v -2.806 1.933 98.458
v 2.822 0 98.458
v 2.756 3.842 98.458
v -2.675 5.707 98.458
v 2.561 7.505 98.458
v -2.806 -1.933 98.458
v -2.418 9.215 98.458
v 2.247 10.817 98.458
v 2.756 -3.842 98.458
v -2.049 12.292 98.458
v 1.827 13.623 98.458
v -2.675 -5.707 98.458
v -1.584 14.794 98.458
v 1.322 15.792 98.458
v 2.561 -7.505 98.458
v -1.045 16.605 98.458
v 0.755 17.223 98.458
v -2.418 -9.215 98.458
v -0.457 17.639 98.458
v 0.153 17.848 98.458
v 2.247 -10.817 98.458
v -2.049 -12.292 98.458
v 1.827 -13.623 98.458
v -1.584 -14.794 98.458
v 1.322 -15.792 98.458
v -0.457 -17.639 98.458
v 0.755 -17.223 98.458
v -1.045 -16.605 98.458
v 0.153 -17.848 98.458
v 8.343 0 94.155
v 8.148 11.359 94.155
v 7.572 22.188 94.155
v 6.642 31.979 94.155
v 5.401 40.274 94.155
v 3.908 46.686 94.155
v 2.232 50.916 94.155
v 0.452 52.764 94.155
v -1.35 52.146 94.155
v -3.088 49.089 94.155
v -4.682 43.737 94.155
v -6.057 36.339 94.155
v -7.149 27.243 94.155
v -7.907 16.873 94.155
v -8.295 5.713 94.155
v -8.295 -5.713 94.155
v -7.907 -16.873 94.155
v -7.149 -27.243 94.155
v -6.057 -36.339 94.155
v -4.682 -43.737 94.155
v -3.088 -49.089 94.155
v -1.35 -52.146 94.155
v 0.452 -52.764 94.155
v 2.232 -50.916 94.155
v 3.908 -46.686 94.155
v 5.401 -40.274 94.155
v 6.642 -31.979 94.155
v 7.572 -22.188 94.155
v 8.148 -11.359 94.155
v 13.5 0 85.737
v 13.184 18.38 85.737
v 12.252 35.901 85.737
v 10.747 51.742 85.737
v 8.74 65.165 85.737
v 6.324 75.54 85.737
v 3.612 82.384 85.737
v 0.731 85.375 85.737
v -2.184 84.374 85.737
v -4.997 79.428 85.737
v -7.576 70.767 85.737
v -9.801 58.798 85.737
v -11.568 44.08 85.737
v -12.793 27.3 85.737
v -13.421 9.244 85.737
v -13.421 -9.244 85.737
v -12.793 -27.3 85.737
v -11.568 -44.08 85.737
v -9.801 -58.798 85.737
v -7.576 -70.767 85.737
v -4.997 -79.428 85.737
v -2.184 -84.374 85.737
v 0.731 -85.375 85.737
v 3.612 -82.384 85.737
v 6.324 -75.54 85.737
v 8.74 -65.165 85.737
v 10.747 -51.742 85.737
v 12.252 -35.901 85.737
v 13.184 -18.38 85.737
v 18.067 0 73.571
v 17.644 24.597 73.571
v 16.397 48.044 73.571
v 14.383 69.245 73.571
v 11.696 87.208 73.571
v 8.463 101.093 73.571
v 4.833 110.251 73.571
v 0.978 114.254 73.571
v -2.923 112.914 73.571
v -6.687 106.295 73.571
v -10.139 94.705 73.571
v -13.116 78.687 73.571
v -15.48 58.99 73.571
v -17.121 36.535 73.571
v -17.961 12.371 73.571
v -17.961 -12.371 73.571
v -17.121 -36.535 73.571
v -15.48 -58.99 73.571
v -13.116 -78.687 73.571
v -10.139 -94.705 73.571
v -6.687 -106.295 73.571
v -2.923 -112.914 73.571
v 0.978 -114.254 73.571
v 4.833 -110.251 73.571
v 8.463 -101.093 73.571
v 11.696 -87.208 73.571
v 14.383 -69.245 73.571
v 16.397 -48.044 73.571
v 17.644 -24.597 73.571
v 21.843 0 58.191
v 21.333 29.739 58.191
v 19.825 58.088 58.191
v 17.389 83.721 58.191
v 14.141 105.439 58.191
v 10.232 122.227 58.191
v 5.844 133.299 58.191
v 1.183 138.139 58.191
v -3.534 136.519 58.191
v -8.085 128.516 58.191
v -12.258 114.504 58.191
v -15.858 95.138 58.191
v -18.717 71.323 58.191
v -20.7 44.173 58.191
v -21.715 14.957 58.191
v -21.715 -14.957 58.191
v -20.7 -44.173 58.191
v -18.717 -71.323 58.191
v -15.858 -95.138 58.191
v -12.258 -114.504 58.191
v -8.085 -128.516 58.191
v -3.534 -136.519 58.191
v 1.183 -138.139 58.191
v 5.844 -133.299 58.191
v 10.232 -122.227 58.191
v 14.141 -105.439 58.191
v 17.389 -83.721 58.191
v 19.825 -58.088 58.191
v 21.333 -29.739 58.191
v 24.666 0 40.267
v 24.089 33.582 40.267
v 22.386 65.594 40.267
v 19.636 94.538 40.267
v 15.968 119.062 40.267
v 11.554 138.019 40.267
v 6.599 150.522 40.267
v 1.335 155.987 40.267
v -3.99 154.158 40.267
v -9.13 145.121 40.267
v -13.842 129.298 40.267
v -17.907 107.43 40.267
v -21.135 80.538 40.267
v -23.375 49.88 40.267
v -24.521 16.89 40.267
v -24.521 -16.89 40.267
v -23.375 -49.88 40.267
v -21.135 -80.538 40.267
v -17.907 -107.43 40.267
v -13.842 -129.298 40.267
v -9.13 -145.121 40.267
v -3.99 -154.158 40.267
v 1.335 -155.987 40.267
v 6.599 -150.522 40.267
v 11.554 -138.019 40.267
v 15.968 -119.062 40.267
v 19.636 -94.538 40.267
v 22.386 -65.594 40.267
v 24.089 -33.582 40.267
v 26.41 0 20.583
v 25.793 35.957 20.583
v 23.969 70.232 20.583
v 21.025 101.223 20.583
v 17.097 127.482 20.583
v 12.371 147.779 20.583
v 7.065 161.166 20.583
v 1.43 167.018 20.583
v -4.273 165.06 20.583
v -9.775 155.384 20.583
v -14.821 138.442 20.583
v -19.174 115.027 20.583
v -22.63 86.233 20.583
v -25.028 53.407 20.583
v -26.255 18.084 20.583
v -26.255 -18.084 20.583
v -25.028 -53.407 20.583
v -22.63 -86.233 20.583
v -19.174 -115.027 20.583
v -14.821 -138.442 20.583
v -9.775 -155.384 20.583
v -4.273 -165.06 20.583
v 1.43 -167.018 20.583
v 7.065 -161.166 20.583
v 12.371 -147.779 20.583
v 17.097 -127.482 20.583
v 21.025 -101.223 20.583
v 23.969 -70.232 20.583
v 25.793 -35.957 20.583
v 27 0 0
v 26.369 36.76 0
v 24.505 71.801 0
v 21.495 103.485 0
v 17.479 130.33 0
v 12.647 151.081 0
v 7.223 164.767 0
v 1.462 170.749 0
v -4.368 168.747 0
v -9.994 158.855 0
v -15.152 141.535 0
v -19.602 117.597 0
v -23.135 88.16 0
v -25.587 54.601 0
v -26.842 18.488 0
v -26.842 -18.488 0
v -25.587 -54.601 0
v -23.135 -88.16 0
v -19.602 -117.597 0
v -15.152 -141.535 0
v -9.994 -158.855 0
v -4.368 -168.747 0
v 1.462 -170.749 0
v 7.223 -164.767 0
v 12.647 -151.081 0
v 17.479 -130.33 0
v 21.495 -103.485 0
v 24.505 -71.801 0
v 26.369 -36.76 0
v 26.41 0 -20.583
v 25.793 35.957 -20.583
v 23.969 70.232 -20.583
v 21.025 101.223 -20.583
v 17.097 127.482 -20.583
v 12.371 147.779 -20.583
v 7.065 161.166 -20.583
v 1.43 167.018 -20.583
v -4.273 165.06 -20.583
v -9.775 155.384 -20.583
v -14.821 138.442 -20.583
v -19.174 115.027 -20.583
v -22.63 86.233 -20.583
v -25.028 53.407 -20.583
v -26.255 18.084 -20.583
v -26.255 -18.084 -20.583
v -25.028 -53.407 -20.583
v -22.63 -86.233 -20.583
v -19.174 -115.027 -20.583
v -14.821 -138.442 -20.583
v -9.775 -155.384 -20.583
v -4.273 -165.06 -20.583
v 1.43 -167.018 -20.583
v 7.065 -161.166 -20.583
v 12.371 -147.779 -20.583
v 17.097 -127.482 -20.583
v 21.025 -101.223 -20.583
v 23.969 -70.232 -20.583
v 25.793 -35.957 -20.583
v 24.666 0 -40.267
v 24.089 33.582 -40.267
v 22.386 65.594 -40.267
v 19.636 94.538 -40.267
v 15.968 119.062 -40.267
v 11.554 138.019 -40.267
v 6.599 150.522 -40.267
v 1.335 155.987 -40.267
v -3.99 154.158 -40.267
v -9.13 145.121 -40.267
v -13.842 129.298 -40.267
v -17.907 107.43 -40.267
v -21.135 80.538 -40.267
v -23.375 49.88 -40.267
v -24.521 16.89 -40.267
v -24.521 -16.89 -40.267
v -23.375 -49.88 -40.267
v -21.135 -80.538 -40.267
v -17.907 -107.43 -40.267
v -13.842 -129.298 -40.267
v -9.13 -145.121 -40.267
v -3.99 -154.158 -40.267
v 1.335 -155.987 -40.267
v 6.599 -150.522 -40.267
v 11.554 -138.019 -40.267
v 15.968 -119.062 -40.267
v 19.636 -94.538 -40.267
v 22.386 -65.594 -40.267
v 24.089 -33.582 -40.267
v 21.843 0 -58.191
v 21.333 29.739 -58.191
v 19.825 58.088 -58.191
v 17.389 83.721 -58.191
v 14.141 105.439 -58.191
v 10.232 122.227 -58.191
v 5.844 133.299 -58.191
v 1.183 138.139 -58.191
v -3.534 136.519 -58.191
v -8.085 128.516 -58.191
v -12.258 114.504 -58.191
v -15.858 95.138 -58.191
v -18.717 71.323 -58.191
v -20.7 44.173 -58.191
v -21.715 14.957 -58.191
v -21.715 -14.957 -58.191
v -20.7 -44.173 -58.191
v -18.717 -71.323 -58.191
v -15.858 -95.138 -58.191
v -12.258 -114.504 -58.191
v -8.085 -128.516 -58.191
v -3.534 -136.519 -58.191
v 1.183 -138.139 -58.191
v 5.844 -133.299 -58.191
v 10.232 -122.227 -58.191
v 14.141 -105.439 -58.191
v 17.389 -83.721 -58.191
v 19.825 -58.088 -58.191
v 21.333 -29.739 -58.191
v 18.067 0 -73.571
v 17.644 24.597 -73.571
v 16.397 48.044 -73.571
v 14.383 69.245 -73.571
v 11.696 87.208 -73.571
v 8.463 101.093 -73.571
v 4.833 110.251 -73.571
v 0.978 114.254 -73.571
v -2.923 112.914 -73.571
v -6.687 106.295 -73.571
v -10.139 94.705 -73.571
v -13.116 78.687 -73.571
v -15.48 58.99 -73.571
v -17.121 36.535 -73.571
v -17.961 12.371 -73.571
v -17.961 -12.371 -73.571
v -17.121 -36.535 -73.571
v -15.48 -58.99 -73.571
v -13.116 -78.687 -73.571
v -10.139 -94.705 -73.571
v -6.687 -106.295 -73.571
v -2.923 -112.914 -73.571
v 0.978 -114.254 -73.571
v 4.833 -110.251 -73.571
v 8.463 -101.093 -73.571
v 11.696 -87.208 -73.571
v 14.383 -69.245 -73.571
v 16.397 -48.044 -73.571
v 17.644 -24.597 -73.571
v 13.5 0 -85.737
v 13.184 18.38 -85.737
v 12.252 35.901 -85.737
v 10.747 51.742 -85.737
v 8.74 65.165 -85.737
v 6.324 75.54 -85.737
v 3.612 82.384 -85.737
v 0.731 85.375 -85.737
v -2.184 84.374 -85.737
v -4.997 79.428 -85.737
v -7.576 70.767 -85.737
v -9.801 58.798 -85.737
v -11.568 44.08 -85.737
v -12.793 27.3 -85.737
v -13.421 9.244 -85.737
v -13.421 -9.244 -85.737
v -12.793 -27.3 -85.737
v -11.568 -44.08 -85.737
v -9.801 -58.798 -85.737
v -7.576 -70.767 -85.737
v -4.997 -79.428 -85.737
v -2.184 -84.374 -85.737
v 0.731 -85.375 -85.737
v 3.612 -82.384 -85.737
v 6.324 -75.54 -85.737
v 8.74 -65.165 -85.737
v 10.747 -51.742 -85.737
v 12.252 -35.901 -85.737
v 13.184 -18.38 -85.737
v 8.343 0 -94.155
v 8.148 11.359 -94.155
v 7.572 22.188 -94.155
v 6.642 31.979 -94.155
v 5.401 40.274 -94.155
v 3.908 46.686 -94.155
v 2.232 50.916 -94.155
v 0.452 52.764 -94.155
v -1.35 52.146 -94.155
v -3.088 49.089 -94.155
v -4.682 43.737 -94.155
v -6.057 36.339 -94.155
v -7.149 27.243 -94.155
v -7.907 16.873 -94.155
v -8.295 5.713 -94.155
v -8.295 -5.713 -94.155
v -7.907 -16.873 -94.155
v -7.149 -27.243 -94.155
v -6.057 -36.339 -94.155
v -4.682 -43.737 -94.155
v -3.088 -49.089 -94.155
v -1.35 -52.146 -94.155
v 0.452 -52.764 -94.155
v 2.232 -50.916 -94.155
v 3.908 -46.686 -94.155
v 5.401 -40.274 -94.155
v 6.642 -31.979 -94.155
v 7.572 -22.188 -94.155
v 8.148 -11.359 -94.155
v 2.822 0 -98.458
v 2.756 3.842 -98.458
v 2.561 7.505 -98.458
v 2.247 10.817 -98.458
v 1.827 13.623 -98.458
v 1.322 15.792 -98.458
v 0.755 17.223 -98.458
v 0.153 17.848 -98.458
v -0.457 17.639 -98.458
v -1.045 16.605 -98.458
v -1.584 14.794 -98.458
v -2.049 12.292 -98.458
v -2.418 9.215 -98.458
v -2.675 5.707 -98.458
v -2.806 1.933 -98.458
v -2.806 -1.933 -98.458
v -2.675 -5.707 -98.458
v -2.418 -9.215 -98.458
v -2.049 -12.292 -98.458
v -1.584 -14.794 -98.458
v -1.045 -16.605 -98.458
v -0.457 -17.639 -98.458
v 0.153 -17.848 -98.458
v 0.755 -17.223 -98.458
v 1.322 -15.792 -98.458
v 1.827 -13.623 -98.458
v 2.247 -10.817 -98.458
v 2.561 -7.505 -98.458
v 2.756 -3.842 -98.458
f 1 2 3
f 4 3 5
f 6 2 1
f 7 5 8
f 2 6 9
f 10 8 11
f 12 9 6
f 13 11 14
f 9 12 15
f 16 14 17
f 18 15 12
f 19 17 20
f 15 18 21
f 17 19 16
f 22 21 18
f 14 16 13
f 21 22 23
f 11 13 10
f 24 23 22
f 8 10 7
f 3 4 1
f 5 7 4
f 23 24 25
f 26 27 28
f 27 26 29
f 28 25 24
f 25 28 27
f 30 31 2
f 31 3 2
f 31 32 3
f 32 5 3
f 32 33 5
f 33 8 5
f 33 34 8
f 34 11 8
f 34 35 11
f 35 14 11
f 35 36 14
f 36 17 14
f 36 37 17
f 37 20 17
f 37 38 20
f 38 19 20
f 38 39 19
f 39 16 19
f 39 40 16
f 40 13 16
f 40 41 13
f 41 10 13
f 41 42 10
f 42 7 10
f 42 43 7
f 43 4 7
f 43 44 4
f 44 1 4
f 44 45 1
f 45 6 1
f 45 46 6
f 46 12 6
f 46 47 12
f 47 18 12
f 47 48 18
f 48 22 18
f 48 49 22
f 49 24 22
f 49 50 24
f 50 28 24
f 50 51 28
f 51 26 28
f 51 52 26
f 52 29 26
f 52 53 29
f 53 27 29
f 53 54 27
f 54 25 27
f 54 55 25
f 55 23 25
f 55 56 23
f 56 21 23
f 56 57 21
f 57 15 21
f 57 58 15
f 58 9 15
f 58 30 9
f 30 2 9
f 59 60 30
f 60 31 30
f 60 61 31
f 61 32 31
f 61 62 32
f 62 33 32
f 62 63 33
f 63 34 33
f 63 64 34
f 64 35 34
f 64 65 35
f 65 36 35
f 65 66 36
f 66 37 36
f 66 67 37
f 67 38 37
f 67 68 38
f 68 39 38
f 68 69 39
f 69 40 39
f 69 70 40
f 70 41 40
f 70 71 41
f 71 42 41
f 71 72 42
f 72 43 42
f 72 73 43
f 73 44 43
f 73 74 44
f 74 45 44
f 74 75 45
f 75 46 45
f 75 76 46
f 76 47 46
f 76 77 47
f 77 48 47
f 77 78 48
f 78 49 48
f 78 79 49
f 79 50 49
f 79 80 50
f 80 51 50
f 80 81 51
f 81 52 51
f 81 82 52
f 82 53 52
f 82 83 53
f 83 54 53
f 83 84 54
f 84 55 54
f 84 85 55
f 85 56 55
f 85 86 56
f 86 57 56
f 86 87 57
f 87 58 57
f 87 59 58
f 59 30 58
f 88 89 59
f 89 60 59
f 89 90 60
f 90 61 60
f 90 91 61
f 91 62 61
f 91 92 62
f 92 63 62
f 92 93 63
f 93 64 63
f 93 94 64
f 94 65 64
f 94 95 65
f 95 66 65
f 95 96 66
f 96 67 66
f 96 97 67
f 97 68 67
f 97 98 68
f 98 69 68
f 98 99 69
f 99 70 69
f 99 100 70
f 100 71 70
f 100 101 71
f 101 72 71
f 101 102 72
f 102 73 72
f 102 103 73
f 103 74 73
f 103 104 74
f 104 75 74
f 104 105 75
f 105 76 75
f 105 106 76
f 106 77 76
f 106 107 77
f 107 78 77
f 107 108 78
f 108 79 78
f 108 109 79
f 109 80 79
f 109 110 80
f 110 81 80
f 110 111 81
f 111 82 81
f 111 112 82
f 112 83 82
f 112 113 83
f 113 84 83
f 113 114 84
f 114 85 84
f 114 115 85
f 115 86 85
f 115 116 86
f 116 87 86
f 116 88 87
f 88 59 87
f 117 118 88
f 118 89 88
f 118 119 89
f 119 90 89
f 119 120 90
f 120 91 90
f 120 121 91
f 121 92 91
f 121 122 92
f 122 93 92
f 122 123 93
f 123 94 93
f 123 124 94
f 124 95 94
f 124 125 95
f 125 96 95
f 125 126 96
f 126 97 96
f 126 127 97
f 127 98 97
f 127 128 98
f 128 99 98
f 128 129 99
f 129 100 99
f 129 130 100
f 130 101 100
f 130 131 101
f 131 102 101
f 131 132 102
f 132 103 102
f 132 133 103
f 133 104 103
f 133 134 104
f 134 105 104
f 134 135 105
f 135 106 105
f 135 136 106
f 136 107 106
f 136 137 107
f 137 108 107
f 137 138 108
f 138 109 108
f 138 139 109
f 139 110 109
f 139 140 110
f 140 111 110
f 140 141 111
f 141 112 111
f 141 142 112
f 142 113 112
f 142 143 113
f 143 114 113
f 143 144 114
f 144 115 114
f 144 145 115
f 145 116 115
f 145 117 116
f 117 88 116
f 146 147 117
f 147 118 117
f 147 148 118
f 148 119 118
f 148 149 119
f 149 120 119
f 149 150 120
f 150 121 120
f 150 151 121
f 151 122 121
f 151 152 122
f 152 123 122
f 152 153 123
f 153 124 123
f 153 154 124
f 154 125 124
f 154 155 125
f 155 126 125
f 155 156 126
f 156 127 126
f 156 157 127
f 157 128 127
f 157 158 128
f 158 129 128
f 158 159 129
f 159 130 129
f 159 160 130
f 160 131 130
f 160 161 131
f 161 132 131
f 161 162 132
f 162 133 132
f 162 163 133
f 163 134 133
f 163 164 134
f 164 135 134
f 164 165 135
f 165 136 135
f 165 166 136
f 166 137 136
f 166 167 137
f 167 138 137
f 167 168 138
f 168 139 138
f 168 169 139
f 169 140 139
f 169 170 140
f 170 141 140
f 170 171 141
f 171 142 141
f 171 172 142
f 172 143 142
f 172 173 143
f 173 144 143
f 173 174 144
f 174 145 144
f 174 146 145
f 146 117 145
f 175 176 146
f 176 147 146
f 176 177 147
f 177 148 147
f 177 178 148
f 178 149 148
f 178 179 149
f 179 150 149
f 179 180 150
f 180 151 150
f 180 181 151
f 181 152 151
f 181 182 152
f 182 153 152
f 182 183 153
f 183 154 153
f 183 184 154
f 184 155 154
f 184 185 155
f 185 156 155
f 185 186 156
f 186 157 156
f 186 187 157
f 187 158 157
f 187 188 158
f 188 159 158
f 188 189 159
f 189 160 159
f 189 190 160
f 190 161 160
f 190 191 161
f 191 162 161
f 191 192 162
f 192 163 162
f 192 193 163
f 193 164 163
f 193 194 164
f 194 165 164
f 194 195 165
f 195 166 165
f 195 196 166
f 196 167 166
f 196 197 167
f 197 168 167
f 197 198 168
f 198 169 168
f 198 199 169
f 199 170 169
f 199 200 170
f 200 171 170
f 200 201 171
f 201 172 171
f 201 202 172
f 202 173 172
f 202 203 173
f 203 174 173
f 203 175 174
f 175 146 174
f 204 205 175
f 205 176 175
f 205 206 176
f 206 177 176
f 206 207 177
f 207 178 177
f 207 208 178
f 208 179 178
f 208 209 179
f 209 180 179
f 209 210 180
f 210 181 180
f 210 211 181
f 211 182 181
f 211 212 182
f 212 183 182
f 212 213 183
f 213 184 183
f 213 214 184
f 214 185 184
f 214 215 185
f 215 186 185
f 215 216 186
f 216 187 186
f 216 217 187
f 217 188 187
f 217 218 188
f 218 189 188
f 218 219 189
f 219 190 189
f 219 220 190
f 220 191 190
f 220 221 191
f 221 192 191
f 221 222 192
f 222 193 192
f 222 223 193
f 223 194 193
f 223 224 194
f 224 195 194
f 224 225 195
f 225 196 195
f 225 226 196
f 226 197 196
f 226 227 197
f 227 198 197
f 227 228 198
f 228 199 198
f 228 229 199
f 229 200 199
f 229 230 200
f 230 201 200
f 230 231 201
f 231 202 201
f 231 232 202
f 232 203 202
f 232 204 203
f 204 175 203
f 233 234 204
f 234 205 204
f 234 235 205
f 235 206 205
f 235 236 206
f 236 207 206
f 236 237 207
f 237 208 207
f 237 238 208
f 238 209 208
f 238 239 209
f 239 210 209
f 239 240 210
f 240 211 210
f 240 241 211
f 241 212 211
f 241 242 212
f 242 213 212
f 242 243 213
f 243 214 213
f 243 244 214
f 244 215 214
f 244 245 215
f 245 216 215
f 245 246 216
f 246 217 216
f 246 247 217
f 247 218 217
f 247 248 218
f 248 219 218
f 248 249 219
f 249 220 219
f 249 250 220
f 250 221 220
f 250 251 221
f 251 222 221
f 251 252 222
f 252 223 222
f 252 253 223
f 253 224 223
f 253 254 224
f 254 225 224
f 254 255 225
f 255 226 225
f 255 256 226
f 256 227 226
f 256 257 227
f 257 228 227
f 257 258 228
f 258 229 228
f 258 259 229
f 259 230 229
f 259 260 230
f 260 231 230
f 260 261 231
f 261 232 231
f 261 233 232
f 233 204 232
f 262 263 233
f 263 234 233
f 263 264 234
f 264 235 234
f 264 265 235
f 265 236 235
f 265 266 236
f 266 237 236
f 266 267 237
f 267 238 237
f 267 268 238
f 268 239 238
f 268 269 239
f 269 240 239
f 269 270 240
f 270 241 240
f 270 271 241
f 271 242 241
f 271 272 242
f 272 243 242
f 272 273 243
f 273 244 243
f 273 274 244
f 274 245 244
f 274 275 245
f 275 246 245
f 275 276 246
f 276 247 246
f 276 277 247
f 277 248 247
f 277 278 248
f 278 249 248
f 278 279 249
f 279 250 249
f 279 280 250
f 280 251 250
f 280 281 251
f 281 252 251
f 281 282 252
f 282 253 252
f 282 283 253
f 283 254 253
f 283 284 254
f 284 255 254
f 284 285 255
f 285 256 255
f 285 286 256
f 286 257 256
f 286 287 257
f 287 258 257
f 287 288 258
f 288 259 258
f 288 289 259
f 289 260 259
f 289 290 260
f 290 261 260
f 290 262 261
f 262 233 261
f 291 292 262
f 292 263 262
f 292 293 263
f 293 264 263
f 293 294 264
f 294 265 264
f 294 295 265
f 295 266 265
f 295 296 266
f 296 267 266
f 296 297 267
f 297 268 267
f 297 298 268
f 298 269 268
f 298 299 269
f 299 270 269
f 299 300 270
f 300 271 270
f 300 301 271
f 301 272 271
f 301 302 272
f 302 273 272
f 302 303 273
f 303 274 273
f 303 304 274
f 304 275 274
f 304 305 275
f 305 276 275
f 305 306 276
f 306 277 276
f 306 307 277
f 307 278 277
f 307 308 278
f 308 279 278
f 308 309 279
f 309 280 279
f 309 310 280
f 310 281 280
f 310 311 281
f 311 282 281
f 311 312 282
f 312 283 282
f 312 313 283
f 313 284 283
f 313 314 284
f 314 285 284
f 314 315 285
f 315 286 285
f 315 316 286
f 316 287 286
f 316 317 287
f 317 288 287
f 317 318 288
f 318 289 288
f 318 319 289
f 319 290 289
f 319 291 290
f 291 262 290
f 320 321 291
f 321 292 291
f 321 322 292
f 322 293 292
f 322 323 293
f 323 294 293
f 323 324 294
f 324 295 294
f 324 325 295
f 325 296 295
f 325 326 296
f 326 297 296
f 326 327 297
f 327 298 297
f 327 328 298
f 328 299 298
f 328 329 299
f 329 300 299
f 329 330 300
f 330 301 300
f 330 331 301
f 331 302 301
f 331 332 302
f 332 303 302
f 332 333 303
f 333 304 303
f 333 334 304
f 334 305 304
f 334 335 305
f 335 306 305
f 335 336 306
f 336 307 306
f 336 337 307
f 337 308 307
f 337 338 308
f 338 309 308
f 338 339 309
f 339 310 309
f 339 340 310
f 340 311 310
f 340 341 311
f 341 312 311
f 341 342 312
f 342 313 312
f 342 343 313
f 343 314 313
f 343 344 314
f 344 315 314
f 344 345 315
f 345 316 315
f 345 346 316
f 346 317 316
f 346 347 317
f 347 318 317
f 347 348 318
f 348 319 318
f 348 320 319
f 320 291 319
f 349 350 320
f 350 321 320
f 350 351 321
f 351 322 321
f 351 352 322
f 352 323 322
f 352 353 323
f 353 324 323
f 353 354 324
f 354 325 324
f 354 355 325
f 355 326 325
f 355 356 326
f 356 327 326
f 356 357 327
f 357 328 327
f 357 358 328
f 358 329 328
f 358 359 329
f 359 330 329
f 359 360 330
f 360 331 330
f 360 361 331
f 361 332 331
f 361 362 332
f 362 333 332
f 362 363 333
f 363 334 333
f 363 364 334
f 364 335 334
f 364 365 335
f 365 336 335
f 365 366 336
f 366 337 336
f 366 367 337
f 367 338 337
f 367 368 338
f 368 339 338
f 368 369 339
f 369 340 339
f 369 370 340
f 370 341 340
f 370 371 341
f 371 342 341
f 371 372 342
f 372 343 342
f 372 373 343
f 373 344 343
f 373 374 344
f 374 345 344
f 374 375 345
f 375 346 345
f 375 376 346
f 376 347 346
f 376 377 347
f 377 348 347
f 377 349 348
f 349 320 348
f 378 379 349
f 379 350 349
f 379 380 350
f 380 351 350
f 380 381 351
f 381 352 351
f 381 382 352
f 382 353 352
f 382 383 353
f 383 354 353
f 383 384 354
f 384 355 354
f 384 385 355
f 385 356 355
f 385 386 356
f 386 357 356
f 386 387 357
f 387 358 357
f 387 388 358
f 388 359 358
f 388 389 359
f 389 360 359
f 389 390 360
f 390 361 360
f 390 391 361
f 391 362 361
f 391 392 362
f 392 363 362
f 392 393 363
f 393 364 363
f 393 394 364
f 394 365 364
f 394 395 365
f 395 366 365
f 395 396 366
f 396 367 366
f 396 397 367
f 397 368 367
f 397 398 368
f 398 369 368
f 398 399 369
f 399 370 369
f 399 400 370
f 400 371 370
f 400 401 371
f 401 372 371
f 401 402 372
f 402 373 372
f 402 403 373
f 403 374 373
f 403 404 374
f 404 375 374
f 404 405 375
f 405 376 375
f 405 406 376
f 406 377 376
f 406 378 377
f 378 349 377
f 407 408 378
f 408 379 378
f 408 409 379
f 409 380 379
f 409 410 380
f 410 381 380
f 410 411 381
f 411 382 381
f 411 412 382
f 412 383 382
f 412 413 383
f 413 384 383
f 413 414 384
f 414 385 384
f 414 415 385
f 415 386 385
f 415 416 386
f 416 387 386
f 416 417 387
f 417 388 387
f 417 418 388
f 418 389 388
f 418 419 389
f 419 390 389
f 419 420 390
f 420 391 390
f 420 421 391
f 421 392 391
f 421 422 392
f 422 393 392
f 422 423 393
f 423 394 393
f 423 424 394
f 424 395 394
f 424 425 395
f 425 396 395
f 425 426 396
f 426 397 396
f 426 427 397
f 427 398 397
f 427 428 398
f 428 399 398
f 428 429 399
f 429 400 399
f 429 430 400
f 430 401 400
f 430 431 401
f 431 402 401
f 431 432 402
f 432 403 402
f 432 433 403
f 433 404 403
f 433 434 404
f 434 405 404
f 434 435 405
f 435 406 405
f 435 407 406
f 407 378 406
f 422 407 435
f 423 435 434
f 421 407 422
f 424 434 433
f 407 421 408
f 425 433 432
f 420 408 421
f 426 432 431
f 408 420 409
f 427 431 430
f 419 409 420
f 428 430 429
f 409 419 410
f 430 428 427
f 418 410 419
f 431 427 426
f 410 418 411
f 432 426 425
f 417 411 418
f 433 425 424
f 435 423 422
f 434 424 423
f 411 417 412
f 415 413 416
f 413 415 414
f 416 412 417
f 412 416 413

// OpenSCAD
// Generated by SolidPython 1.0.1 on 2020-07-29 00:46:46


scale(v = [3, 19, 11]) {
	sphere(r = 9);
}
/***********************************************
*********      SolidPython code:      **********
************************************************
 
# import packages: SolidPython
from solid import *
from solid.utils import *
from itertools import chain, combinations, permutations


class Resize:

    def __init__(self, scad_file):
        self.scad_file = scad_file
        #self.scad_file = import_scad(scad_file)
        # cone/cylinder param:
        self.r1 = 0
        self.r2 = 0
        self.h = 0
        # rectangular prism param:
        self.w = 0
        self.l = 0
        # ellipse param:
        self.r = 0

    # import OpenScad code (file name corresponds to shape)


    # classify shape + parameters
    def assign(self, param1, param2, param3):
        if self.scad_file == 'cone.scad':
            self.r1 = param1
            self.r2 = param2
            self.h = param3
        elif self.scad_file == 'cylinder.scad':
            self.r1 = param1
            self.r2 = param2
            self.h = param3
        elif self.scad_file == 'rectangularPrism.scad':
            self.h = param1
            self.l = param2
            self.w = param3
        else:
            self.r = param1
            self.h = param2

    # resize parameters
    def iterate(self):
        x = range(3, 20, 2)
        i = 1
        if self.scad_file == 'cone.scad':
            tempList = list(permutations(x, 2))
            for temp in tempList:
                param1 = temp[0]
                param2 = temp[1]
                filepath = 'produced_scad_files/' + 'cone' + str(param1) + '_' + str(param2) + '_' + '.scad'
                scad_render_to_file(cylinder(h=param1, r1=param2, r2=0), filepath)

        elif self.scad_file == 'cylinder.scad':
            tempList = list(permutations(x, 3))
            for temp in tempList:
                param1 = temp[0]
                param2 = temp[1]
                filepath = 'produced_scad_files/' + 'cylinder' + str(param1) + '_' + str(param2) + '_' + '.scad'
                scad_render_to_file(cylinder(h=param1, r1=param2, r2=param2), filepath)

        elif self.scad_file == 'rectangularPrism.scad':
            tempList = list(permutations(x, 3))
            for temp in tempList:
                param1 = temp[0]
                param2 = temp[1]
                param3 = temp[2]
                filepath = 'produced_scad_files/' + 'rectangularPrism' + str(param1) + '_' + str(param2) + '_' + str(
                    param3) + '.scad'
                scad_render_to_file(cube(size=(param1, param2, param3)), filepath)

        elif self.scad_file == 'ellipse.scad':
            tempList = list(permutations(x, 4))
            for temp in tempList:
                param1 = temp[0]
                param2 = temp[1]
                param3 = temp[2]
                param4 = temp[3]
                filepath = 'produced_scad_files/' + 'ellipse' + str(param1) + '_' + str(param2) + '_' + str(param3) + '_' + str(param4) + '.scad'
                scad_render_to_file(scale([param1, param2, param3])(sphere(r=param4)), filepath)

    def render_to_scadfile(self):
        scad_render_to_file(scad, 'example.scad') 
 
************************************************/
